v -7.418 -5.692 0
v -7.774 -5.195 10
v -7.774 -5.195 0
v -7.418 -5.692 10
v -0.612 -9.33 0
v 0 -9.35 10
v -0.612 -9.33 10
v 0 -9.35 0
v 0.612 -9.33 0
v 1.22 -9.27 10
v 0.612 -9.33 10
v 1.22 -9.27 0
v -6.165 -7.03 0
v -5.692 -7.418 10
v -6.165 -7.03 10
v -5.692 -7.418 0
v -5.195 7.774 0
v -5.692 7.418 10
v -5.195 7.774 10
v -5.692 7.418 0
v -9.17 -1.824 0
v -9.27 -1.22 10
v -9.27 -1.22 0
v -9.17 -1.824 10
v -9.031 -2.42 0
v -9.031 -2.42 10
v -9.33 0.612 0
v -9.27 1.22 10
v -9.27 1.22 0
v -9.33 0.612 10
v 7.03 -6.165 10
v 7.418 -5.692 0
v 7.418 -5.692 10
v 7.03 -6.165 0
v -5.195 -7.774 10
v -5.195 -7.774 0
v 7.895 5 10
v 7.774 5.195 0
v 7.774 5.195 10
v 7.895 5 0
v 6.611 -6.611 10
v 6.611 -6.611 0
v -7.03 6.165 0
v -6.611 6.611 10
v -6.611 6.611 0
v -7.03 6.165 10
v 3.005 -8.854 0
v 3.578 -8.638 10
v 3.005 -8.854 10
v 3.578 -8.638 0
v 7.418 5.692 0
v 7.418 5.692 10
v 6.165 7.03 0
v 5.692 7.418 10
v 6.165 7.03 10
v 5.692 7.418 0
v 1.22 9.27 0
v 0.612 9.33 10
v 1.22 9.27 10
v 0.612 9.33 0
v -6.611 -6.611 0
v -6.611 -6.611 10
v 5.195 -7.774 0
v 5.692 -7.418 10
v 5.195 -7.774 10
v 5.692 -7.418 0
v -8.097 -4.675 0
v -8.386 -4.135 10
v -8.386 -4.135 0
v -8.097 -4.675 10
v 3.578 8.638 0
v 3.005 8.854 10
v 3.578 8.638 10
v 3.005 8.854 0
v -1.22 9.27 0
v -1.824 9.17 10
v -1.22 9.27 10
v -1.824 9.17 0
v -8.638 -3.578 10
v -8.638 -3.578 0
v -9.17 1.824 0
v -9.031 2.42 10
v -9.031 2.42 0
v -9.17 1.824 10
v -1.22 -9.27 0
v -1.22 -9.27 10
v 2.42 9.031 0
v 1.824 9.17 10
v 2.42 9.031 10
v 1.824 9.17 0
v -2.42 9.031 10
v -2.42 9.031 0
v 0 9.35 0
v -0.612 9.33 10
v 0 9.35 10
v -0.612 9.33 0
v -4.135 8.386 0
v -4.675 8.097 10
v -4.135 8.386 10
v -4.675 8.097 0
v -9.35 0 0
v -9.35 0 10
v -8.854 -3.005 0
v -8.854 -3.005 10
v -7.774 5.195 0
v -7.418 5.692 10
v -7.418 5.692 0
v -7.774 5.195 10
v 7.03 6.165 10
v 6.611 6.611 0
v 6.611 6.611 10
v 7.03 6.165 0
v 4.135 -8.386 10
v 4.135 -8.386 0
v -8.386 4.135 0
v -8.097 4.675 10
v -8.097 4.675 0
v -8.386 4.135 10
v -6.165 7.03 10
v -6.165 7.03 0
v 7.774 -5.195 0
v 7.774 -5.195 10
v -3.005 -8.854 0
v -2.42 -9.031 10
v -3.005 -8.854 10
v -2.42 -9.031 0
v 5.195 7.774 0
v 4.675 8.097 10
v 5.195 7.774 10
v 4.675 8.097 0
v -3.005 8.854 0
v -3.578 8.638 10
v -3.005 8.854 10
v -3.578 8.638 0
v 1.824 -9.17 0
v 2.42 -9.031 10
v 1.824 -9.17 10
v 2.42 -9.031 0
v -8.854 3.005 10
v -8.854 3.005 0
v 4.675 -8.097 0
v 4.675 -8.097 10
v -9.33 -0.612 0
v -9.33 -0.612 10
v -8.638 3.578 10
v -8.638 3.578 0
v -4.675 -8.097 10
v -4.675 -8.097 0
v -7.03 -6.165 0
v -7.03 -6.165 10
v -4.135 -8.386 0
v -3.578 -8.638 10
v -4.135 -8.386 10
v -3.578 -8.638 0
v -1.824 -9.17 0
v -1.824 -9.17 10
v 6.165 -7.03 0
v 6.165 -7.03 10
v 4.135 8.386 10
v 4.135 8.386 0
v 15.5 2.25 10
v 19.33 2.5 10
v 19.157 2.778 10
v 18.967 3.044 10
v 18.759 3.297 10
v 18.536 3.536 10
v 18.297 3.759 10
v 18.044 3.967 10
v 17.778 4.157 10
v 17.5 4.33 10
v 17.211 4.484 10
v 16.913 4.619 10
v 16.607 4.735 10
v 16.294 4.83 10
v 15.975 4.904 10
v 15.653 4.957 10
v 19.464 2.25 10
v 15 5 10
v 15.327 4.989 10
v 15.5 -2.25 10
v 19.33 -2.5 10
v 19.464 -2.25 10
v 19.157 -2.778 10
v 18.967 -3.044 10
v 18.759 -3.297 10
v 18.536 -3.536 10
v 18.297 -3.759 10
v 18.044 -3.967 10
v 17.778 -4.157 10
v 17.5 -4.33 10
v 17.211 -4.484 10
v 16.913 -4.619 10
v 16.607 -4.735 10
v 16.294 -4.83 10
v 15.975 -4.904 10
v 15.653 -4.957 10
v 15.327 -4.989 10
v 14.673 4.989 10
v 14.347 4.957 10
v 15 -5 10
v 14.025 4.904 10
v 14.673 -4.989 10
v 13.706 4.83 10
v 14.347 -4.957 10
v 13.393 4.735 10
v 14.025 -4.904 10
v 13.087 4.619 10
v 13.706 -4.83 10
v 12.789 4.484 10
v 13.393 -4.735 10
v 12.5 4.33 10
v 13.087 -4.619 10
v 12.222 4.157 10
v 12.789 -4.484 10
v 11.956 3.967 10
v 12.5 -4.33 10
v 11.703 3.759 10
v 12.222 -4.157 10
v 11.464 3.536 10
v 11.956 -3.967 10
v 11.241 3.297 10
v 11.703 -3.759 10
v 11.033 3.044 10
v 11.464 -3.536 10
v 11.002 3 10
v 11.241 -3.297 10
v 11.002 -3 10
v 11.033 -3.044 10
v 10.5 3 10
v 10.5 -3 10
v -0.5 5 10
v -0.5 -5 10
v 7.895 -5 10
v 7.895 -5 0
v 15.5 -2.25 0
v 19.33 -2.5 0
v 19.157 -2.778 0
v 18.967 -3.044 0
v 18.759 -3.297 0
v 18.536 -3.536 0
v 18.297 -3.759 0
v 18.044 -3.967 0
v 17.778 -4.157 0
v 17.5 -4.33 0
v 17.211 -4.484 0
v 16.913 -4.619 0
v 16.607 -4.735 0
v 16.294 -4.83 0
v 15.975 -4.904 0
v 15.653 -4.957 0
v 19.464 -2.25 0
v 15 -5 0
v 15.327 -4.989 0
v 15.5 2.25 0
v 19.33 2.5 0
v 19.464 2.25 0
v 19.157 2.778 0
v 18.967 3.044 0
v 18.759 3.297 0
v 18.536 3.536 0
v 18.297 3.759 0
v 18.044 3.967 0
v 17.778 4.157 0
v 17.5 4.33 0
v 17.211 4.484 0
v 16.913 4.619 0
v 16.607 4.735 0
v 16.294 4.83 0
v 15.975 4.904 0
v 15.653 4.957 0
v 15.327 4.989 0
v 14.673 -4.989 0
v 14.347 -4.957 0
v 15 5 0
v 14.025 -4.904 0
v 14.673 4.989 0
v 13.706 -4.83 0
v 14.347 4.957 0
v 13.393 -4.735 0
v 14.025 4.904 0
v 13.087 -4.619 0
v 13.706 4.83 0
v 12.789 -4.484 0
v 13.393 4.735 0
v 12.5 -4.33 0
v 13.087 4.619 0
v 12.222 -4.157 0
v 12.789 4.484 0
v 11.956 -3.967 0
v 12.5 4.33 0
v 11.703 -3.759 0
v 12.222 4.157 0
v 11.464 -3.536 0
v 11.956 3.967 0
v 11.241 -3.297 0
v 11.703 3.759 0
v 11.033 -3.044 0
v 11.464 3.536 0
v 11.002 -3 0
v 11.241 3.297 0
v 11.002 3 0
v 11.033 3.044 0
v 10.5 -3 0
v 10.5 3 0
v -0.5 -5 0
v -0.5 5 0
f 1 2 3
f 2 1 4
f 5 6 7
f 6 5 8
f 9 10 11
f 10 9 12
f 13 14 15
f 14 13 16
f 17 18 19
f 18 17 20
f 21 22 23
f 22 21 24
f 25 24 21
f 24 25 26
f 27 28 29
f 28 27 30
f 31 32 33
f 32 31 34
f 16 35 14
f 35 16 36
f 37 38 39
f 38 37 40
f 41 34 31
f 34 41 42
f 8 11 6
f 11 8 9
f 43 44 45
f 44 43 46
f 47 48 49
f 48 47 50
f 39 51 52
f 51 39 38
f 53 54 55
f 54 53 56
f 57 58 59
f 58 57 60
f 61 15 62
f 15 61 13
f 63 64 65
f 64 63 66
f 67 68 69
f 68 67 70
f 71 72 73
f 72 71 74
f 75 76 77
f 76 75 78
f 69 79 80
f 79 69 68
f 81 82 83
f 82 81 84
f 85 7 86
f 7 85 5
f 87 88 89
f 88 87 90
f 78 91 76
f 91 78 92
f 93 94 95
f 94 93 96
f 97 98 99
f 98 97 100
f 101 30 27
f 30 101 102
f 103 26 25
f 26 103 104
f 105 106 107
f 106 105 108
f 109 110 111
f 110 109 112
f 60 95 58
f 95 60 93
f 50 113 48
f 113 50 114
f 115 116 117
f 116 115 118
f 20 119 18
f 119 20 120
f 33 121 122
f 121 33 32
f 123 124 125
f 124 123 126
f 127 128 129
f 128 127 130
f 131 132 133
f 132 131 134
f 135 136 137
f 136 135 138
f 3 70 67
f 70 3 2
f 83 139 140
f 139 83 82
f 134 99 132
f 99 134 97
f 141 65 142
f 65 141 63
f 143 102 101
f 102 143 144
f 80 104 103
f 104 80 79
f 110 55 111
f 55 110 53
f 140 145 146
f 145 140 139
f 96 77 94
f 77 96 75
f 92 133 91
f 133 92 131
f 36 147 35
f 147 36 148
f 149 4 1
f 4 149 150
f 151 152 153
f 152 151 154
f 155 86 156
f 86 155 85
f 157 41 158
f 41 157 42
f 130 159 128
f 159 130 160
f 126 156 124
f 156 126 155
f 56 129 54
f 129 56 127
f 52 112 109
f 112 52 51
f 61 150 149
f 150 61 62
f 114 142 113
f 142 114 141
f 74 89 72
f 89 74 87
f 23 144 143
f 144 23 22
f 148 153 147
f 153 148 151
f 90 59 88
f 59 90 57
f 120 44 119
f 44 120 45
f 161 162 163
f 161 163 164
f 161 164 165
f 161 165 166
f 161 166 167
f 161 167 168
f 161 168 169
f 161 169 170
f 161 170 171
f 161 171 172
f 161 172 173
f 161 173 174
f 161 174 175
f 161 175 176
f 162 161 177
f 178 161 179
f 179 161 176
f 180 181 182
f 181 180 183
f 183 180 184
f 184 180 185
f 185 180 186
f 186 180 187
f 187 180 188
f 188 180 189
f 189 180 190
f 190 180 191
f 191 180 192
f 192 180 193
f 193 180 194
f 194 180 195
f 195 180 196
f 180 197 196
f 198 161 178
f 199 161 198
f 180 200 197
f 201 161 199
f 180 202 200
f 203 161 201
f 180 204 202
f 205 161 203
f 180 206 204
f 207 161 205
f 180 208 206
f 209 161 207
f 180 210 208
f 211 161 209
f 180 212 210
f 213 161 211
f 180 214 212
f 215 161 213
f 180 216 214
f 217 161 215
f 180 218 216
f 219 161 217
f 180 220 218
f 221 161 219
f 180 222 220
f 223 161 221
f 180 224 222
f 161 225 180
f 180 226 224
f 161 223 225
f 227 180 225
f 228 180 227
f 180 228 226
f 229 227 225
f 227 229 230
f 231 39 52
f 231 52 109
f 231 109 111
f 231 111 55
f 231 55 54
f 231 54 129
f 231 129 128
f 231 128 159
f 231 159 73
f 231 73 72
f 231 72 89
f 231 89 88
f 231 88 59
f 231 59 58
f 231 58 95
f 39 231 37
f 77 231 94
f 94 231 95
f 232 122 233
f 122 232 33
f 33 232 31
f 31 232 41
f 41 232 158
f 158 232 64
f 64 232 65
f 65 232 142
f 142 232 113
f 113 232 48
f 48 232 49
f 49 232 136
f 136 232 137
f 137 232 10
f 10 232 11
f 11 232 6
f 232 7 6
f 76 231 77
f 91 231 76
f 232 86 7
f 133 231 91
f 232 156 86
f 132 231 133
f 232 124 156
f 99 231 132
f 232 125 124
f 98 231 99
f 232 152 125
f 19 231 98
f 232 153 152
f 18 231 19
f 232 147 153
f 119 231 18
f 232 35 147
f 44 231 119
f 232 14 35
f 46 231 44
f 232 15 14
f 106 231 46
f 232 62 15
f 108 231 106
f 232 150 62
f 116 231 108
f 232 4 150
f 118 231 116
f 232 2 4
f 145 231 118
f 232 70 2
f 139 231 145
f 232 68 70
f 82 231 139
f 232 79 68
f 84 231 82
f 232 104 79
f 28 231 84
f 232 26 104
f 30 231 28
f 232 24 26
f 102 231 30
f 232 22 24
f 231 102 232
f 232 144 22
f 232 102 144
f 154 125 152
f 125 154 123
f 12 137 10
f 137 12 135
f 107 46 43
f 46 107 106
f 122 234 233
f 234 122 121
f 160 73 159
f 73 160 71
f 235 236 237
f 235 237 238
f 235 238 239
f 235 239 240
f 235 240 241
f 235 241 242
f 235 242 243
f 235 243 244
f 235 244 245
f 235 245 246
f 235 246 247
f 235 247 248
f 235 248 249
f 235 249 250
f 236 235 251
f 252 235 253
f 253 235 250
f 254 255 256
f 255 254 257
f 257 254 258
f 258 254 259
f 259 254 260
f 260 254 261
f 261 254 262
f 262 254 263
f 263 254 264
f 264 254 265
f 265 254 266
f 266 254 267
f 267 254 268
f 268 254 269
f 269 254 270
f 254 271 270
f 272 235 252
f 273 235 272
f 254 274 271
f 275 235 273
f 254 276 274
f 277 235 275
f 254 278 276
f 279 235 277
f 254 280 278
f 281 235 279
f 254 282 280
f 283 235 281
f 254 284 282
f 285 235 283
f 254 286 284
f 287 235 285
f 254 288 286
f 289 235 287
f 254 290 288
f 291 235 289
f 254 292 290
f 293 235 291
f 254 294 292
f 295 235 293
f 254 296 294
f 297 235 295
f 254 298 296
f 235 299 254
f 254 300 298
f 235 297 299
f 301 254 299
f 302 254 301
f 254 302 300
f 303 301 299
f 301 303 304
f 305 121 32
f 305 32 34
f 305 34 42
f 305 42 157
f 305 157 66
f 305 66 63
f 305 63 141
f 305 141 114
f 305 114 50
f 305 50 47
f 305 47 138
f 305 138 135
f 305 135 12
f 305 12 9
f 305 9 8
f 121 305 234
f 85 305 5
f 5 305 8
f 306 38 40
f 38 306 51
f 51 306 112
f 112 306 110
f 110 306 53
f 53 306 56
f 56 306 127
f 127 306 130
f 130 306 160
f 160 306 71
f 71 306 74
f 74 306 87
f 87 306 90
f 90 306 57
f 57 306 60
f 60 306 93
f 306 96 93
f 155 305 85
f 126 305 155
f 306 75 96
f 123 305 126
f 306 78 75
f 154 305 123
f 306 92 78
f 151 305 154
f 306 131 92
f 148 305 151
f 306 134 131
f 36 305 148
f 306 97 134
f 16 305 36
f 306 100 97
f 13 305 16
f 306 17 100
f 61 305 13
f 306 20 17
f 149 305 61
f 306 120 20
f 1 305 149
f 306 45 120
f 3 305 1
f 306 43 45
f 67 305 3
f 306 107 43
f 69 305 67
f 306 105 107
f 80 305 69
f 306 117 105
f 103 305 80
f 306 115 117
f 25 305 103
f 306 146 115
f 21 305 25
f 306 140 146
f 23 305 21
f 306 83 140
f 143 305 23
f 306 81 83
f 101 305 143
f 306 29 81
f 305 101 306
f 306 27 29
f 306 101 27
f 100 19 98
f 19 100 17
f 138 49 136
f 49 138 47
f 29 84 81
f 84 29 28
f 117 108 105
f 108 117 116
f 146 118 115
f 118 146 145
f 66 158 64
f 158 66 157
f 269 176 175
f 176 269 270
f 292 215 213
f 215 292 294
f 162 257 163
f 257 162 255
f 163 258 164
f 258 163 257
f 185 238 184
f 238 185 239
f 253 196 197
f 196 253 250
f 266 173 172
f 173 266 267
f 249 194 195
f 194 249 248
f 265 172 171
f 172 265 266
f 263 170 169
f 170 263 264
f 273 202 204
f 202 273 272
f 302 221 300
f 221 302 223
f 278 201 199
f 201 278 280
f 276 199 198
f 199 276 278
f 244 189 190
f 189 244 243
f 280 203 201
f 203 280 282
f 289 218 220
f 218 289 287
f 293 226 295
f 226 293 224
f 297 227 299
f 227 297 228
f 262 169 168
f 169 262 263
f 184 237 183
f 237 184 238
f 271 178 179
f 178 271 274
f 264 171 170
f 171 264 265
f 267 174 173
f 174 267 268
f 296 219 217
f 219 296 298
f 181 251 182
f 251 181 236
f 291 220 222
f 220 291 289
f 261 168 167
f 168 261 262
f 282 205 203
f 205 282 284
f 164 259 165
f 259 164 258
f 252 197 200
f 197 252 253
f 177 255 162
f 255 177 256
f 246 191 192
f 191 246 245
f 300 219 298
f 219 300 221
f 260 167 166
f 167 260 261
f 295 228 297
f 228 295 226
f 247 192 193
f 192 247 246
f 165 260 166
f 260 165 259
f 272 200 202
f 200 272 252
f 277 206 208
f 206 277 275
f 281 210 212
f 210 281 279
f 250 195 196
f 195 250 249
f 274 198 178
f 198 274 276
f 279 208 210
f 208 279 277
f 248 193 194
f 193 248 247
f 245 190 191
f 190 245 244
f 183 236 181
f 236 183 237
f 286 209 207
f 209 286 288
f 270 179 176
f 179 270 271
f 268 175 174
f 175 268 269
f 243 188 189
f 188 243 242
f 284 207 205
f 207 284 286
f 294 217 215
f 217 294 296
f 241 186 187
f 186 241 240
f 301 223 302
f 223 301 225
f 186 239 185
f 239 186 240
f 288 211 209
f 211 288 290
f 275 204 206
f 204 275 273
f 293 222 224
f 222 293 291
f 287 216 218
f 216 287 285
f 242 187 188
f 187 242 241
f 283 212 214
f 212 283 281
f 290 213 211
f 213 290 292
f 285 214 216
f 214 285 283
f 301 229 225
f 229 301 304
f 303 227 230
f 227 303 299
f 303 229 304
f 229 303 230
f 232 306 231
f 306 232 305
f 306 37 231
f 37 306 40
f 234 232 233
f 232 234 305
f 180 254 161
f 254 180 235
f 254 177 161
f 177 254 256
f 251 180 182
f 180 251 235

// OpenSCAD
// Snap-on clip for tubing next to a 12.7 mm lab stand rod
// Print orientation: flat on the bed, extruded along +Z

$fn = 96;

// ---- Rod ring ----
rod_id     = 12.7;   // rod inner diameter
rod_wall   = 3;      // rod ring wall thickness
rod_od     = rod_id + 2 * rod_wall;  // 18.7 mm outer diameter
rod_open   = 10;     // opening width on the -X side
rod_h      = 10;     // extrusion height (Z)

// ---- Tubing ring ----
tube_id    = 6;      // tubing inner diameter
tube_wall  = 2;      // tubing ring wall thickness
tube_od    = tube_id + 2 * tube_wall; // 10 mm outer diameter
tube_x     = 15;     // tubing ring centre X
tube_open  = 4.5;    // opening width on the +X side

// ---- Bridge ----
bridge_w   = 6;      // bridge width in Y
bridge_x0  = 8;      // bridge start X
bridge_x1  = 12;     // bridge end X

// ---- Cutting overlap ----
eps        = 0.5;    // extension of cutters past faces

difference() {
    union() {
        // Rod ring
        cylinder(d = rod_od, h = rod_h);
        // Tubing ring
        translate([tube_x, 0, 0])
            cylinder(d = tube_od, h = rod_h);
        // Solid bridge
        translate([bridge_x0, -bridge_w / 2, 0])
            cube([bridge_x1 - bridge_x0, bridge_w, rod_h]);
    }
    // Rod ring opening (removes everything with x < 0 and -5 < y < 5)
    translate([-eps, -rod_open / 2, -eps])
        cube([rod_open + 2 * eps, rod_open, rod_h + 2 * eps]);
    // Tubing ring opening (removes x > 15 and -2.25 < y < 2.25)
    translate([tube_x + eps, -tube_open / 2, -eps])
        cube([rod_h + 2 * eps, tube_open, eps + rod_h + 2 * eps]);
}
